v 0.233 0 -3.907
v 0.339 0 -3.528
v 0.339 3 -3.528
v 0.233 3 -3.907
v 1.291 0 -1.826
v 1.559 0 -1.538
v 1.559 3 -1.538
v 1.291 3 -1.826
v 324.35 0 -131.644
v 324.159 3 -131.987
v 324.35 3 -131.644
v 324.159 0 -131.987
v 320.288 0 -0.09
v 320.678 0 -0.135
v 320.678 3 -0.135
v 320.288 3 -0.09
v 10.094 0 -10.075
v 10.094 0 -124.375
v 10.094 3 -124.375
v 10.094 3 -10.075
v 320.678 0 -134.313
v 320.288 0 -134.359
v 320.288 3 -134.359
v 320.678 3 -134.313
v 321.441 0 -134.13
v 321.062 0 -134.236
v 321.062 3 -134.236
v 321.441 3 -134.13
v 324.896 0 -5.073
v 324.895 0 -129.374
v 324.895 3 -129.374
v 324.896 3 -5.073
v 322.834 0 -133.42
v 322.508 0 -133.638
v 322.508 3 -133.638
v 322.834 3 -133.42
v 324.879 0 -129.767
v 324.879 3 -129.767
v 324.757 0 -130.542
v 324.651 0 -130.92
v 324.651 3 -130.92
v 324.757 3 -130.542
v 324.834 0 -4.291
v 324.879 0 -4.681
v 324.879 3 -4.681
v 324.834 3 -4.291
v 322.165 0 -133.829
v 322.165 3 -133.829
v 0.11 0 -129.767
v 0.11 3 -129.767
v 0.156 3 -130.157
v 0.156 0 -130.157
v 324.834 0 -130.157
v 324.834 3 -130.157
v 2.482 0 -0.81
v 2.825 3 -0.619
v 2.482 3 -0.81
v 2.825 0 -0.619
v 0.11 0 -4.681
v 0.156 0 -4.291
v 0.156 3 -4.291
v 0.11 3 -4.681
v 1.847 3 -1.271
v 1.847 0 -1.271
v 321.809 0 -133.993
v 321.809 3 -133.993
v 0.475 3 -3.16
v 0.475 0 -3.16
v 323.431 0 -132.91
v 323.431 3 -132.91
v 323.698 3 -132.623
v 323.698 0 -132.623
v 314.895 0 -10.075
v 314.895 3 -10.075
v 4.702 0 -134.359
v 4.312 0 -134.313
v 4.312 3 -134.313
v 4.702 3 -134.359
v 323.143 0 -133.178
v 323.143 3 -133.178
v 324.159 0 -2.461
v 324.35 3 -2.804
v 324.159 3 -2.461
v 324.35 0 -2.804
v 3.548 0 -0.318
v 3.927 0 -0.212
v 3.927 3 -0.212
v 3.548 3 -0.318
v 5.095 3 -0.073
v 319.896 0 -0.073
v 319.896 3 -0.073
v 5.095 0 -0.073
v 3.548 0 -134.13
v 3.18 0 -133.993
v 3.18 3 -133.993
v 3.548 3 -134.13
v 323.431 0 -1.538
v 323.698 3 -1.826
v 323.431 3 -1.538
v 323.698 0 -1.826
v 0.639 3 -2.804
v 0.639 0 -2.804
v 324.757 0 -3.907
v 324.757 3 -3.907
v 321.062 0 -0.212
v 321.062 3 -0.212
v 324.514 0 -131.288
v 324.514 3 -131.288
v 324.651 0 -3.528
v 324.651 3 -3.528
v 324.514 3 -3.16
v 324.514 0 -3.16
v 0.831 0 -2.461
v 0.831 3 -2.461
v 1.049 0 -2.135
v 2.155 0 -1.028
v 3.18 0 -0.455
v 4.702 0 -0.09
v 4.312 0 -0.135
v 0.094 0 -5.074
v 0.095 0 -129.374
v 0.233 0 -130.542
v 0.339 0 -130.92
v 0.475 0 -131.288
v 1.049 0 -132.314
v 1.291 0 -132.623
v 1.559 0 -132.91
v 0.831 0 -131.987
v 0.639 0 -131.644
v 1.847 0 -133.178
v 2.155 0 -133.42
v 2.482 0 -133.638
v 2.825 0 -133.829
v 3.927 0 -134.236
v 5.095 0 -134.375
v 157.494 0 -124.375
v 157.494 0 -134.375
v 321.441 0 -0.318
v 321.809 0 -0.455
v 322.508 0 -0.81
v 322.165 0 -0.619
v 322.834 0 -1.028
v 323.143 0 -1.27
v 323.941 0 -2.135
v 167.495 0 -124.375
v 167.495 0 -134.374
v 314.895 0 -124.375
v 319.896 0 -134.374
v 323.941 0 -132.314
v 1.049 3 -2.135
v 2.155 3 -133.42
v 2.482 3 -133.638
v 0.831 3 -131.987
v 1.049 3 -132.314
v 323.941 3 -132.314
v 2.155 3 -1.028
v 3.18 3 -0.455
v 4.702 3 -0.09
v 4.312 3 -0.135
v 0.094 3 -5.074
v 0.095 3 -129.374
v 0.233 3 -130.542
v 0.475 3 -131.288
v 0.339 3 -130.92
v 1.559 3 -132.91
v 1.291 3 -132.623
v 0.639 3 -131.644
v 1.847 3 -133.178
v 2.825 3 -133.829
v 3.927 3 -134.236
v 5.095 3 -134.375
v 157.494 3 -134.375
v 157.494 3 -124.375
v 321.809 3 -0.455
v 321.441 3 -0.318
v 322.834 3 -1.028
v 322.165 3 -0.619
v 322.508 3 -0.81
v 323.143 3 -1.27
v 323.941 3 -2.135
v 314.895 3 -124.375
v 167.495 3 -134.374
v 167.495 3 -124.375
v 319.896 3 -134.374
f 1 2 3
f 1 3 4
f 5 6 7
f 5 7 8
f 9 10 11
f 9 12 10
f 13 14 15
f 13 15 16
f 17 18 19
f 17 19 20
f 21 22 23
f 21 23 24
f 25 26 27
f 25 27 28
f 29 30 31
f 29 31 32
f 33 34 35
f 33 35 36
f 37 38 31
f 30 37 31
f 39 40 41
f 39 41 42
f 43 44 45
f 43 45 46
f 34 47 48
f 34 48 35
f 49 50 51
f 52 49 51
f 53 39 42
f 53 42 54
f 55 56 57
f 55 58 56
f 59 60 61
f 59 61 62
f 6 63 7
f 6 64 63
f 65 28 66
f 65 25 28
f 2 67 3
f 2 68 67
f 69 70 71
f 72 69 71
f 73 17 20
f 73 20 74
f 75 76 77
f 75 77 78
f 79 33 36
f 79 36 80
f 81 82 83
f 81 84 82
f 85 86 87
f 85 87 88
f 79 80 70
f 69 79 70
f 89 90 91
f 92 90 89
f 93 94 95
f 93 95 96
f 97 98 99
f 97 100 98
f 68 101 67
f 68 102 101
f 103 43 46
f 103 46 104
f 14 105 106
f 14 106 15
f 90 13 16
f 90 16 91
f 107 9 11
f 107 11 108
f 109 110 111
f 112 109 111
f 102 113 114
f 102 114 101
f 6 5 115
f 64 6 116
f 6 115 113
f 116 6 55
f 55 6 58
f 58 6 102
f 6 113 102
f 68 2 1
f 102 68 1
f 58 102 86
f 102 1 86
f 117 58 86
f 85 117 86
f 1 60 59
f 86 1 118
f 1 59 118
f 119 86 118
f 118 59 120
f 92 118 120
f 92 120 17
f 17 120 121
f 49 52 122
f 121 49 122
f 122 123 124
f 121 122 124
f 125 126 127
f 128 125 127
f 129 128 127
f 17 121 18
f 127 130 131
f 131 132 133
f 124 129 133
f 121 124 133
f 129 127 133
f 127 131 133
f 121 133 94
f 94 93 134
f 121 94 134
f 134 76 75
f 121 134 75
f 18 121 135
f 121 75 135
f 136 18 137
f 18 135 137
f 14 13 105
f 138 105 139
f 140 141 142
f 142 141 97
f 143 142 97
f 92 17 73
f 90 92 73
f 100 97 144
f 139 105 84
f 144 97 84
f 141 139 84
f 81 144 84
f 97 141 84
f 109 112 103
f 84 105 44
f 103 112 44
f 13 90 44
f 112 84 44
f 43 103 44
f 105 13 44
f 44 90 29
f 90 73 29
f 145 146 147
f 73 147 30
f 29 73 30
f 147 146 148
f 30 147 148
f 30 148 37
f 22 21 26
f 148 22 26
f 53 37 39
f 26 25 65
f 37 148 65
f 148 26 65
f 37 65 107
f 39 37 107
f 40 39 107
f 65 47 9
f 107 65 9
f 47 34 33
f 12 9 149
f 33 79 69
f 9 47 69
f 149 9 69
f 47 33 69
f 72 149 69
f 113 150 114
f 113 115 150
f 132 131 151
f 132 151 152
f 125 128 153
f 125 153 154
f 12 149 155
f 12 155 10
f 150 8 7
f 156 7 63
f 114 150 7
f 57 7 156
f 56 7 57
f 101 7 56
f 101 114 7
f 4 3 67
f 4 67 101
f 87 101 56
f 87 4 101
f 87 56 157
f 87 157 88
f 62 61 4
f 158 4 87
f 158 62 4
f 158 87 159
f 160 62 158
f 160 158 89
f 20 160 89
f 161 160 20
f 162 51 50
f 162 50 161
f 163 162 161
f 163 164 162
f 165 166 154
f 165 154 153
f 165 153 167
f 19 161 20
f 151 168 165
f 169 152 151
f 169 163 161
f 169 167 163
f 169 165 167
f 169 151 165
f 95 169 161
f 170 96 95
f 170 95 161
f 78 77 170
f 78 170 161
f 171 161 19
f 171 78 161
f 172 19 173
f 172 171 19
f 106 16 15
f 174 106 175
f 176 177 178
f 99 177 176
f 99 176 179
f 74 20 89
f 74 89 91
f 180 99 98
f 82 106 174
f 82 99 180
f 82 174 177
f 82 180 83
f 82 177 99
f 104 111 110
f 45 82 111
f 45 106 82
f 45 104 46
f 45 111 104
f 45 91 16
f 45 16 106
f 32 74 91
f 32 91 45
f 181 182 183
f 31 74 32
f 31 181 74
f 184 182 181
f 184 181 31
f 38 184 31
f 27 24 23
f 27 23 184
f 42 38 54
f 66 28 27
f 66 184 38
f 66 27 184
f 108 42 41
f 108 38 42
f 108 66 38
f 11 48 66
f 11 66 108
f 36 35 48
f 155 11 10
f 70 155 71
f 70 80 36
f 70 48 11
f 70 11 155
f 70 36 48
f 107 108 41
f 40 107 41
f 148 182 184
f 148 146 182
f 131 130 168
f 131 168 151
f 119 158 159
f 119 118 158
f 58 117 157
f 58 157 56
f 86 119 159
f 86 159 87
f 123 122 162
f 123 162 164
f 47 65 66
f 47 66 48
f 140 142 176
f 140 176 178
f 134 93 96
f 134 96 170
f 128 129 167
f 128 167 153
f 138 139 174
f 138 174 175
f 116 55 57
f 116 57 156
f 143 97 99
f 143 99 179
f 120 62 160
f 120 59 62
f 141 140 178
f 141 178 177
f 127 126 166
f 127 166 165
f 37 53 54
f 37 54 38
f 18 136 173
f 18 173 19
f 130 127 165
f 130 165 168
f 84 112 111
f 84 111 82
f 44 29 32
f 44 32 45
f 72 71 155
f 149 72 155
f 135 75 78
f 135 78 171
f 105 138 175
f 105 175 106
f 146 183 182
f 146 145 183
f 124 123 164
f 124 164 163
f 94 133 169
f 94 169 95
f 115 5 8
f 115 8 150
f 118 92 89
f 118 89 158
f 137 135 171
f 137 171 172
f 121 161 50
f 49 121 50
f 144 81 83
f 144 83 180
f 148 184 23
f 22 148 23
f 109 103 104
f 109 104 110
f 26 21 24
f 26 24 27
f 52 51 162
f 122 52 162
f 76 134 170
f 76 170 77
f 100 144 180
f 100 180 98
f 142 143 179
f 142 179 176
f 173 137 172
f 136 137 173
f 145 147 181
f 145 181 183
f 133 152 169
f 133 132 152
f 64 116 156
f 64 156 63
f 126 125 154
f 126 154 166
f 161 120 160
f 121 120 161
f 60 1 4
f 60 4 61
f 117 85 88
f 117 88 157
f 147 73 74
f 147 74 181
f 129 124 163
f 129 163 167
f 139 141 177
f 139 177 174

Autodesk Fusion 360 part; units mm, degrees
sketch "Sketch1" plane through (0, 0, 0) normal (0, 1, 0) x (1, 0, 0)
  line L0 (3.5485, 0.3183) -> (3.1805, 0.4548)
  line L1 (2.825, 0.6187) -> (2.4819, 0.8103)
  line L2 (2.1553, 1.028) -> (1.8466, 1.2706)
  line L3 (324.159, 131.987) -> (324.35, 131.644)
  line L4 (324.651, 130.92) -> (324.757, 130.542)
  line L5 (314.895, 10.0748) -> (314.895, 124.375)
  line L6 (321.441, 134.13) -> (321.809, 133.993)
  line L7 (3.1805, 0.4548) -> (2.825, 0.6187)
  line L8 (321.062, 134.236) -> (321.441, 134.13)
  line L9 (324.834, 130.157) -> (324.879, 129.767)
  line L10 (323.941, 2.1346) -> (323.698, 1.8259)
  line L11 (324.834, 4.2912) -> (324.757, 3.9067)
  line L12 (3.9274, 0.2122) -> (3.5485, 0.3183)
  line L13 (2.4819, 0.8103) -> (2.1553, 1.028)
  line L14 (167.495, 124.375) -> (167.495, 134.374)
  line L15 (1.5586, 1.5379) -> (1.2912, 1.8259)
  line L16 (321.062, 0.2122) -> (320.678, 0.135)
  line L17 (321.809, 0.4548) -> (321.441, 0.3183)
  line L18 (324.757, 3.9067) -> (324.651, 3.5278)
  line L19 (324.35, 2.8043) -> (324.159, 2.4612)
  line L20 (324.757, 130.542) -> (324.834, 130.157)
  line L21 (324.514, 131.288) -> (324.651, 130.92)
  line L22 (324.159, 2.4612) -> (323.941, 2.1346)
  line L23 (157.494, 124.375) -> (10.0941, 124.375)
  line L24 (323.431, 1.5379) -> (323.143, 1.2705)
  line L25 (157.494, 134.375) -> (157.494, 124.375)
  line L26 (320.678, 134.313) -> (321.062, 134.236)
  line L27 (323.431, 132.91) -> (323.698, 132.623)
  line L28 (324.879, 129.767) -> (324.895, 129.374)
  line L29 (10.0941, 10.0748) -> (314.895, 10.0748)
  line L30 (320.288, 0.0896) -> (319.896, 0.073)
  line L31 (319.896, 0.073) -> (5.0946, 0.073)
  line L32 (5.0946, 0.073) -> (4.7019, 0.0896)
  line L33 (0.6394, 131.644) -> (0.831, 131.987)
  line L34 (1.2912, 1.8259) -> (1.0487, 2.1346)
  line L35 (167.495, 134.374) -> (319.896, 134.374)
  line L36 (0.831, 2.4612) -> (0.6394, 2.8043)
  line L37 (1.8466, 1.2706) -> (1.5586, 1.5379)
  line L38 (323.941, 132.314) -> (324.159, 131.987)
  line L39 (10.0941, 124.375) -> (10.0941, 10.0748)
  line L40 (0.4754, 3.1598) -> (0.339, 3.5278)
  line L41 (322.508, 0.8103) -> (322.165, 0.6187)
  line L42 (0.0937, 5.0739) -> (0.0951, 129.374)
  line L43 (1.8466, 133.178) -> (2.1553, 133.42)
  line L44 (0.2329, 130.542) -> (0.339, 130.92)
  line L45 (3.1805, 133.993) -> (3.5485, 134.13)
  line L46 (323.698, 132.623) -> (323.941, 132.314)
  line L47 (324.895, 129.374) -> (324.896, 5.0726)
  line L48 (320.678, 0.135) -> (320.288, 0.0896)
  line L49 (324.35, 131.644) -> (324.514, 131.288)
  line L50 (322.834, 133.42) -> (323.143, 133.178)
  line L51 (0.0951, 129.374) -> (0.1102, 129.767)
  line L52 (3.5485, 134.13) -> (3.9274, 134.236)
  line L53 (0.1102, 4.6812) -> (0.0937, 5.0739)
  line L54 (5.0946, 134.375) -> (157.494, 134.375)
  line L55 (319.896, 134.374) -> (320.288, 134.359)
  line L56 (324.896, 5.0726) -> (324.879, 4.6812)
  line L57 (0.1557, 130.157) -> (0.2329, 130.542)
  line L58 (4.7019, 134.359) -> (5.0946, 134.375)
  line L59 (322.508, 133.638) -> (322.834, 133.42)
  line L60 (4.3119, 0.135) -> (3.9274, 0.2122)
  line L61 (324.514, 3.1598) -> (324.35, 2.8043)
  line L62 (4.7019, 0.0896) -> (4.3119, 0.135)
  line L63 (324.879, 4.6812) -> (324.834, 4.2912)
  line L64 (321.441, 0.3183) -> (321.062, 0.2122)
  line L65 (321.809, 133.993) -> (322.165, 133.829)
  line L66 (0.6394, 2.8043) -> (0.4754, 3.1598)
  line L67 (0.831, 131.987) -> (1.0487, 132.314)
  line L68 (0.339, 3.5278) -> (0.2329, 3.9067)
  line L69 (2.4819, 133.638) -> (2.825, 133.829)
  line L70 (1.2912, 132.623) -> (1.5586, 132.91)
  line L71 (322.834, 1.028) -> (322.508, 0.8103)
  line L72 (320.288, 134.359) -> (320.678, 134.313)
  line L73 (1.5586, 132.91) -> (1.8466, 133.178)
  line L74 (0.2329, 3.9067) -> (0.1557, 4.2912)
  line L75 (314.895, 124.375) -> (167.495, 124.375)
  line L76 (323.143, 1.2706) -> (322.834, 1.028)
  line L77 (324.651, 3.5278) -> (324.514, 3.1598)
  line L78 (0.339, 130.92) -> (0.4754, 131.288)
  line L79 (322.165, 0.6187) -> (321.809, 0.4548)
  line L80 (4.3119, 134.313) -> (4.7019, 134.359)
  line L81 (0.1557, 4.2912) -> (0.1102, 4.6812)
  line L82 (0.1102, 129.767) -> (0.1557, 130.157)
  line L83 (3.9274, 134.236) -> (4.3119, 134.313)
  line L84 (2.825, 133.829) -> (3.1805, 133.993)
  line L85 (323.698, 1.8259) -> (323.431, 1.5379)
  line L86 (2.1553, 133.42) -> (2.4819, 133.638)
  line L87 (1.0487, 2.1346) -> (0.831, 2.4612)
  line L88 (0.4754, 131.288) -> (0.6394, 131.644)
  line L89 (1.0487, 132.314) -> (1.2912, 132.623)
  line L90 (322.165, 133.829) -> (322.508, 133.638)
  line L91 (323.143, 133.178) -> (323.431, 132.91)
extrude "Extrude1" add sketch "Sketch1" along normal blind 3
